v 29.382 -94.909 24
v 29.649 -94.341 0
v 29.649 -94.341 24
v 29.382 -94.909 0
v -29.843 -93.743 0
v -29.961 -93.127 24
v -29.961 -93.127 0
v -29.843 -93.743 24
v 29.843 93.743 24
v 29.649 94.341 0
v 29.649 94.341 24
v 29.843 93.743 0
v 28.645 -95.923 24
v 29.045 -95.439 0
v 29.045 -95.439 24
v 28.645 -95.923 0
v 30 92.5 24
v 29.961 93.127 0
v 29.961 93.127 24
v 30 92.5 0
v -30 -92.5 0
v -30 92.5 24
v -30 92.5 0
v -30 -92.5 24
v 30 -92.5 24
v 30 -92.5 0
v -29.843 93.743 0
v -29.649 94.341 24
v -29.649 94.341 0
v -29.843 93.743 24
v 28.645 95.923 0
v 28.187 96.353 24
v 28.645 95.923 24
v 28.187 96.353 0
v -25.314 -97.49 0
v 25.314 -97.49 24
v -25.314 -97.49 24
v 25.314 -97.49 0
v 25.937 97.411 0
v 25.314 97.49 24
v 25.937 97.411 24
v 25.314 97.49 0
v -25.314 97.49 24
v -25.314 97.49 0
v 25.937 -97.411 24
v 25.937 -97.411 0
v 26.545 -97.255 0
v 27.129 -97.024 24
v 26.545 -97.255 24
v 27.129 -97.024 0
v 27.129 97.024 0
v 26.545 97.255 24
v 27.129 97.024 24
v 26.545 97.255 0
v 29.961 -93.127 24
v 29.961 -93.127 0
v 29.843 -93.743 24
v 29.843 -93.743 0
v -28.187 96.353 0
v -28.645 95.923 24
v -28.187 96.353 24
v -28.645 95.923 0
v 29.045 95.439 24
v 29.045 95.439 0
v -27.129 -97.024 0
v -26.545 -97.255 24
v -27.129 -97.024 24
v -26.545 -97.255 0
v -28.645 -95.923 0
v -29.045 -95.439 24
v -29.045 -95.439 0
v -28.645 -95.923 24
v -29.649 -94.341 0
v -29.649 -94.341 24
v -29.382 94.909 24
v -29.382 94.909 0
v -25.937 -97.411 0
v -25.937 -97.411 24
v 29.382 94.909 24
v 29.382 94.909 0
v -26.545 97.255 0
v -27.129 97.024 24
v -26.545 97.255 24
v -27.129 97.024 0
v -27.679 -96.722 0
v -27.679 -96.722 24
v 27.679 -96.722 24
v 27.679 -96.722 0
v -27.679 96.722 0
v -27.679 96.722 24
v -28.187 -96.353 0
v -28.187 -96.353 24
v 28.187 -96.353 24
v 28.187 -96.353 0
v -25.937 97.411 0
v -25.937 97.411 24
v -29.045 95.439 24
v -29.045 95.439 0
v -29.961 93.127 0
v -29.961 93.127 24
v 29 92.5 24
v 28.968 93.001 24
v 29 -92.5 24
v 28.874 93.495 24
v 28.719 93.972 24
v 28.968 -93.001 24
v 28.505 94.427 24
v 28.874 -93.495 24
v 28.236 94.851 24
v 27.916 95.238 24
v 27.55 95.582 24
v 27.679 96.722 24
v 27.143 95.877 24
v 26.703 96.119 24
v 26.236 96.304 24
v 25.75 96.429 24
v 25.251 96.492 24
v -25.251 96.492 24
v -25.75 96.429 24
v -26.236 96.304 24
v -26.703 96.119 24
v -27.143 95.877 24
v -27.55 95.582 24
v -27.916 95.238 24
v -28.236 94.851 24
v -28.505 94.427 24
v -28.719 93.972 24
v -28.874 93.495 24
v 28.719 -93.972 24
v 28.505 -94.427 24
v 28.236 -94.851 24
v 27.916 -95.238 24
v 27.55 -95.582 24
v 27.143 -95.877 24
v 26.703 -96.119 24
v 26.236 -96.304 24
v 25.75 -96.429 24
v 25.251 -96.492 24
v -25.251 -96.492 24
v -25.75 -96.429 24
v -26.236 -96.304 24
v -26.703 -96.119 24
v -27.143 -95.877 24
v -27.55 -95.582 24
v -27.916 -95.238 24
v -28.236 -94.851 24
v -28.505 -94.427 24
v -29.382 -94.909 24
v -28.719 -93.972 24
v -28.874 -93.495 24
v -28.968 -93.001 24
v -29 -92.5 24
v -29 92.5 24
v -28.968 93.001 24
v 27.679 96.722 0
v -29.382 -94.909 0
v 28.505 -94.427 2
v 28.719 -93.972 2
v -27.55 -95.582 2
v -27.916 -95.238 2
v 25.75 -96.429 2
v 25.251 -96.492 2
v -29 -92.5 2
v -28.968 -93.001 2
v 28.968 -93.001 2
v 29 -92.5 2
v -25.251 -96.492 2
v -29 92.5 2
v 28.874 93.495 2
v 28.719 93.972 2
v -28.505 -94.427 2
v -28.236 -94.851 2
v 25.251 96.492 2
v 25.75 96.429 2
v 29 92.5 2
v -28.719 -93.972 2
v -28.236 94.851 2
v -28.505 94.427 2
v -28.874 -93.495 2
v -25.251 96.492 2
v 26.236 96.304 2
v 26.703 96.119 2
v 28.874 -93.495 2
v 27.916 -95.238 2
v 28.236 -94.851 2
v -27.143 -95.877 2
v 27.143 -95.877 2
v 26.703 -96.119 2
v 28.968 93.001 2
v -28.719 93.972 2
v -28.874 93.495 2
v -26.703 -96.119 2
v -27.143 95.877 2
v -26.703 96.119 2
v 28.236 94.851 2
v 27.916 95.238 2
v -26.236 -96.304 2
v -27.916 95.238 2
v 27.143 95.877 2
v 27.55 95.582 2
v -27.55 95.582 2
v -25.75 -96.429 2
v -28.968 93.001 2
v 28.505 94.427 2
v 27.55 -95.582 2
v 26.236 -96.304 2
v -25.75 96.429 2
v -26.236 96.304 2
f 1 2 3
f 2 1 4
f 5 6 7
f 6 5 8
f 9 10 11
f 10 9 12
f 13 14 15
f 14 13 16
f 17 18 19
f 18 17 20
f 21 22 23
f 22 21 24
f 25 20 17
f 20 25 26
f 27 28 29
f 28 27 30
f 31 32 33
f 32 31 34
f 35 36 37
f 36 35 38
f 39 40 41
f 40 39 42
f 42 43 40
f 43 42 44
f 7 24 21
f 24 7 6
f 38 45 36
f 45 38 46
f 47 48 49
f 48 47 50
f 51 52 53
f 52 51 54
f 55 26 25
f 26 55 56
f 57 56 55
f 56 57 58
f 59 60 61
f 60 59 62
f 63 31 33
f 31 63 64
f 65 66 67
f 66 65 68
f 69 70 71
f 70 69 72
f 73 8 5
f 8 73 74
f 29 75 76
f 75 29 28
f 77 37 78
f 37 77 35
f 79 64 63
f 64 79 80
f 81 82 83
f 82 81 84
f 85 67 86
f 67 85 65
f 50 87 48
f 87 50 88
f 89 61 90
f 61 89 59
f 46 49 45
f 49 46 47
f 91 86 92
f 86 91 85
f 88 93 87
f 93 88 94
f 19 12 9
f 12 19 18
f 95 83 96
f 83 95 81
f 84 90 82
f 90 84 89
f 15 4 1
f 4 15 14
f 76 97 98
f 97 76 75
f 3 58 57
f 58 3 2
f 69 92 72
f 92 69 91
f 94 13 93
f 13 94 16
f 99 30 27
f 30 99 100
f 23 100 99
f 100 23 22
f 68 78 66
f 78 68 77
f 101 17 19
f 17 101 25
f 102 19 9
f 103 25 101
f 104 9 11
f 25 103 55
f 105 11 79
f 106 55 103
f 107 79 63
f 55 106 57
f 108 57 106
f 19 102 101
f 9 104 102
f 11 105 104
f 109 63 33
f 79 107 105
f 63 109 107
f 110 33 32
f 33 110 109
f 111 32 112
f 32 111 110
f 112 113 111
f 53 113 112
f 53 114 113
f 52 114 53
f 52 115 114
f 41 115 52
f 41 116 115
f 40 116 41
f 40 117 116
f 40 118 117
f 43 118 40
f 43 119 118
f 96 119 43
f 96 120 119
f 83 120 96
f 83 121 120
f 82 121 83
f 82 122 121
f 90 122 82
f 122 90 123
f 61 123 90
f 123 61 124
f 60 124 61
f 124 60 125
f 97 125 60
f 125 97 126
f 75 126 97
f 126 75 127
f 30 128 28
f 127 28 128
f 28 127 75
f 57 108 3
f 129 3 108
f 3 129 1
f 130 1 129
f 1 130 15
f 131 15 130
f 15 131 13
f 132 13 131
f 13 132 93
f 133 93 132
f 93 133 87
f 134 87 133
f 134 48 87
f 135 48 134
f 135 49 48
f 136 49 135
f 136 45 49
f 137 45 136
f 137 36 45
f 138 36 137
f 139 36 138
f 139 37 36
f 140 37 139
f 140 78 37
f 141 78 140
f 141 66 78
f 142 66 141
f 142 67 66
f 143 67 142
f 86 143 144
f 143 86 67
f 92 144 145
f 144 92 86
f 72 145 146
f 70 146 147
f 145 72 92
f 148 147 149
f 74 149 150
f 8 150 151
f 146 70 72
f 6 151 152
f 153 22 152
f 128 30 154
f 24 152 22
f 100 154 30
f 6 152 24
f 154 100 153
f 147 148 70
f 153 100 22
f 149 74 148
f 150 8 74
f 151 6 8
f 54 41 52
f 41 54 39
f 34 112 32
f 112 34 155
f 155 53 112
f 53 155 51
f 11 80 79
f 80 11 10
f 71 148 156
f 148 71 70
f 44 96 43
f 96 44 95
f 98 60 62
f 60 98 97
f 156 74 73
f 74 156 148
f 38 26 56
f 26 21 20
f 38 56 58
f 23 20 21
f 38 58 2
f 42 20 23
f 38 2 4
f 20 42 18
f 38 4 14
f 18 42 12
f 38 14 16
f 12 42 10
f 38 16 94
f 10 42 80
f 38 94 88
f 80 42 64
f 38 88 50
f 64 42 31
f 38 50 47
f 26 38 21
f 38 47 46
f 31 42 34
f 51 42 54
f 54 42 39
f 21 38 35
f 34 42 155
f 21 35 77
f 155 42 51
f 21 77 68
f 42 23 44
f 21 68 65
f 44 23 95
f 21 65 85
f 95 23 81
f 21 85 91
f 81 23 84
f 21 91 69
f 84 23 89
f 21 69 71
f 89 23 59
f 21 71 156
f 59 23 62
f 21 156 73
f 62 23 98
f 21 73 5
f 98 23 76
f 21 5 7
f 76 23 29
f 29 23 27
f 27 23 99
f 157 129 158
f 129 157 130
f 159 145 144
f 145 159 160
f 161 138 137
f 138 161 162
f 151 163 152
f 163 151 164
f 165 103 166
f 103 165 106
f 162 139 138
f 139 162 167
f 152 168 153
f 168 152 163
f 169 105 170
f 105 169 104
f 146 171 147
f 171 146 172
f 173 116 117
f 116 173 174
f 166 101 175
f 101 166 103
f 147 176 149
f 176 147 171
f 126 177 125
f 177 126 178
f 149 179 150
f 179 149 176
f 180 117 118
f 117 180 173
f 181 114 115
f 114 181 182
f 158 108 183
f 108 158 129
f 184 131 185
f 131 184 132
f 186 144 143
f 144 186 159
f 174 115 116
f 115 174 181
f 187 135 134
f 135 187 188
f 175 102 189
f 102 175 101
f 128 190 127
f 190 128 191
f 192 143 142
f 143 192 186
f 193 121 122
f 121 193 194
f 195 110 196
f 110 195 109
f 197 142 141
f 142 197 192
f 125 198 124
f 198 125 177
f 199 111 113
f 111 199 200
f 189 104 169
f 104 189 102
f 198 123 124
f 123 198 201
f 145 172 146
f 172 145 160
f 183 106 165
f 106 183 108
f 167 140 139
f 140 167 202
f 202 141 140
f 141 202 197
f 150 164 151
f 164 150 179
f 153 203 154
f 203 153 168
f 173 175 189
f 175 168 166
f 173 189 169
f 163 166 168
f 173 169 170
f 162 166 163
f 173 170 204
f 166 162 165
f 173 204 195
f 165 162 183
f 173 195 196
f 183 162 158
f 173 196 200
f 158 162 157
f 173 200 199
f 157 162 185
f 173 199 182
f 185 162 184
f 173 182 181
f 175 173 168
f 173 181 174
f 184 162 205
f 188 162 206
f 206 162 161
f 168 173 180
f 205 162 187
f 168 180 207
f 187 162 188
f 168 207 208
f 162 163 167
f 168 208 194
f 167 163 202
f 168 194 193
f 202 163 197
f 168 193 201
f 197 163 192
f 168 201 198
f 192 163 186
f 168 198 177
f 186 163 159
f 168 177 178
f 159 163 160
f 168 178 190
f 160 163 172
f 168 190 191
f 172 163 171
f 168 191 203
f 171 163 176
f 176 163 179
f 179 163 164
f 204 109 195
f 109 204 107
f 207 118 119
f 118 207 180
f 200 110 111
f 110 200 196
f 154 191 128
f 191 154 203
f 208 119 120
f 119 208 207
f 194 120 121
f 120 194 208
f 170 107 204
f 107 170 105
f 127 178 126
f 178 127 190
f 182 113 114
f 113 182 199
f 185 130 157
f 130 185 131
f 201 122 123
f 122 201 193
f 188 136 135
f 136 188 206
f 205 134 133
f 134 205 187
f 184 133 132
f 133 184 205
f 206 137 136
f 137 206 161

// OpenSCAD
$fn = 50;


difference() {
	union() {
		hull() {
			translate(v = [-25.0000000000, 92.5000000000, 0]) {
				cylinder(h = 24, r = 5);
			}
			translate(v = [25.0000000000, 92.5000000000, 0]) {
				cylinder(h = 24, r = 5);
			}
			translate(v = [-25.0000000000, -92.5000000000, 0]) {
				cylinder(h = 24, r = 5);
			}
			translate(v = [25.0000000000, -92.5000000000, 0]) {
				cylinder(h = 24, r = 5);
			}
		}
	}
	union() {
		translate(v = [0, 0, 2]) {
			hull() {
				translate(v = [-25.0000000000, 92.5000000000, 0]) {
					cylinder(h = 22, r = 4);
				}
				translate(v = [25.0000000000, 92.5000000000, 0]) {
					cylinder(h = 22, r = 4);
				}
				translate(v = [-25.0000000000, -92.5000000000, 0]) {
					cylinder(h = 22, r = 4);
				}
				translate(v = [25.0000000000, -92.5000000000, 0]) {
					cylinder(h = 22, r = 4);
				}
			}
		}
	}
}
